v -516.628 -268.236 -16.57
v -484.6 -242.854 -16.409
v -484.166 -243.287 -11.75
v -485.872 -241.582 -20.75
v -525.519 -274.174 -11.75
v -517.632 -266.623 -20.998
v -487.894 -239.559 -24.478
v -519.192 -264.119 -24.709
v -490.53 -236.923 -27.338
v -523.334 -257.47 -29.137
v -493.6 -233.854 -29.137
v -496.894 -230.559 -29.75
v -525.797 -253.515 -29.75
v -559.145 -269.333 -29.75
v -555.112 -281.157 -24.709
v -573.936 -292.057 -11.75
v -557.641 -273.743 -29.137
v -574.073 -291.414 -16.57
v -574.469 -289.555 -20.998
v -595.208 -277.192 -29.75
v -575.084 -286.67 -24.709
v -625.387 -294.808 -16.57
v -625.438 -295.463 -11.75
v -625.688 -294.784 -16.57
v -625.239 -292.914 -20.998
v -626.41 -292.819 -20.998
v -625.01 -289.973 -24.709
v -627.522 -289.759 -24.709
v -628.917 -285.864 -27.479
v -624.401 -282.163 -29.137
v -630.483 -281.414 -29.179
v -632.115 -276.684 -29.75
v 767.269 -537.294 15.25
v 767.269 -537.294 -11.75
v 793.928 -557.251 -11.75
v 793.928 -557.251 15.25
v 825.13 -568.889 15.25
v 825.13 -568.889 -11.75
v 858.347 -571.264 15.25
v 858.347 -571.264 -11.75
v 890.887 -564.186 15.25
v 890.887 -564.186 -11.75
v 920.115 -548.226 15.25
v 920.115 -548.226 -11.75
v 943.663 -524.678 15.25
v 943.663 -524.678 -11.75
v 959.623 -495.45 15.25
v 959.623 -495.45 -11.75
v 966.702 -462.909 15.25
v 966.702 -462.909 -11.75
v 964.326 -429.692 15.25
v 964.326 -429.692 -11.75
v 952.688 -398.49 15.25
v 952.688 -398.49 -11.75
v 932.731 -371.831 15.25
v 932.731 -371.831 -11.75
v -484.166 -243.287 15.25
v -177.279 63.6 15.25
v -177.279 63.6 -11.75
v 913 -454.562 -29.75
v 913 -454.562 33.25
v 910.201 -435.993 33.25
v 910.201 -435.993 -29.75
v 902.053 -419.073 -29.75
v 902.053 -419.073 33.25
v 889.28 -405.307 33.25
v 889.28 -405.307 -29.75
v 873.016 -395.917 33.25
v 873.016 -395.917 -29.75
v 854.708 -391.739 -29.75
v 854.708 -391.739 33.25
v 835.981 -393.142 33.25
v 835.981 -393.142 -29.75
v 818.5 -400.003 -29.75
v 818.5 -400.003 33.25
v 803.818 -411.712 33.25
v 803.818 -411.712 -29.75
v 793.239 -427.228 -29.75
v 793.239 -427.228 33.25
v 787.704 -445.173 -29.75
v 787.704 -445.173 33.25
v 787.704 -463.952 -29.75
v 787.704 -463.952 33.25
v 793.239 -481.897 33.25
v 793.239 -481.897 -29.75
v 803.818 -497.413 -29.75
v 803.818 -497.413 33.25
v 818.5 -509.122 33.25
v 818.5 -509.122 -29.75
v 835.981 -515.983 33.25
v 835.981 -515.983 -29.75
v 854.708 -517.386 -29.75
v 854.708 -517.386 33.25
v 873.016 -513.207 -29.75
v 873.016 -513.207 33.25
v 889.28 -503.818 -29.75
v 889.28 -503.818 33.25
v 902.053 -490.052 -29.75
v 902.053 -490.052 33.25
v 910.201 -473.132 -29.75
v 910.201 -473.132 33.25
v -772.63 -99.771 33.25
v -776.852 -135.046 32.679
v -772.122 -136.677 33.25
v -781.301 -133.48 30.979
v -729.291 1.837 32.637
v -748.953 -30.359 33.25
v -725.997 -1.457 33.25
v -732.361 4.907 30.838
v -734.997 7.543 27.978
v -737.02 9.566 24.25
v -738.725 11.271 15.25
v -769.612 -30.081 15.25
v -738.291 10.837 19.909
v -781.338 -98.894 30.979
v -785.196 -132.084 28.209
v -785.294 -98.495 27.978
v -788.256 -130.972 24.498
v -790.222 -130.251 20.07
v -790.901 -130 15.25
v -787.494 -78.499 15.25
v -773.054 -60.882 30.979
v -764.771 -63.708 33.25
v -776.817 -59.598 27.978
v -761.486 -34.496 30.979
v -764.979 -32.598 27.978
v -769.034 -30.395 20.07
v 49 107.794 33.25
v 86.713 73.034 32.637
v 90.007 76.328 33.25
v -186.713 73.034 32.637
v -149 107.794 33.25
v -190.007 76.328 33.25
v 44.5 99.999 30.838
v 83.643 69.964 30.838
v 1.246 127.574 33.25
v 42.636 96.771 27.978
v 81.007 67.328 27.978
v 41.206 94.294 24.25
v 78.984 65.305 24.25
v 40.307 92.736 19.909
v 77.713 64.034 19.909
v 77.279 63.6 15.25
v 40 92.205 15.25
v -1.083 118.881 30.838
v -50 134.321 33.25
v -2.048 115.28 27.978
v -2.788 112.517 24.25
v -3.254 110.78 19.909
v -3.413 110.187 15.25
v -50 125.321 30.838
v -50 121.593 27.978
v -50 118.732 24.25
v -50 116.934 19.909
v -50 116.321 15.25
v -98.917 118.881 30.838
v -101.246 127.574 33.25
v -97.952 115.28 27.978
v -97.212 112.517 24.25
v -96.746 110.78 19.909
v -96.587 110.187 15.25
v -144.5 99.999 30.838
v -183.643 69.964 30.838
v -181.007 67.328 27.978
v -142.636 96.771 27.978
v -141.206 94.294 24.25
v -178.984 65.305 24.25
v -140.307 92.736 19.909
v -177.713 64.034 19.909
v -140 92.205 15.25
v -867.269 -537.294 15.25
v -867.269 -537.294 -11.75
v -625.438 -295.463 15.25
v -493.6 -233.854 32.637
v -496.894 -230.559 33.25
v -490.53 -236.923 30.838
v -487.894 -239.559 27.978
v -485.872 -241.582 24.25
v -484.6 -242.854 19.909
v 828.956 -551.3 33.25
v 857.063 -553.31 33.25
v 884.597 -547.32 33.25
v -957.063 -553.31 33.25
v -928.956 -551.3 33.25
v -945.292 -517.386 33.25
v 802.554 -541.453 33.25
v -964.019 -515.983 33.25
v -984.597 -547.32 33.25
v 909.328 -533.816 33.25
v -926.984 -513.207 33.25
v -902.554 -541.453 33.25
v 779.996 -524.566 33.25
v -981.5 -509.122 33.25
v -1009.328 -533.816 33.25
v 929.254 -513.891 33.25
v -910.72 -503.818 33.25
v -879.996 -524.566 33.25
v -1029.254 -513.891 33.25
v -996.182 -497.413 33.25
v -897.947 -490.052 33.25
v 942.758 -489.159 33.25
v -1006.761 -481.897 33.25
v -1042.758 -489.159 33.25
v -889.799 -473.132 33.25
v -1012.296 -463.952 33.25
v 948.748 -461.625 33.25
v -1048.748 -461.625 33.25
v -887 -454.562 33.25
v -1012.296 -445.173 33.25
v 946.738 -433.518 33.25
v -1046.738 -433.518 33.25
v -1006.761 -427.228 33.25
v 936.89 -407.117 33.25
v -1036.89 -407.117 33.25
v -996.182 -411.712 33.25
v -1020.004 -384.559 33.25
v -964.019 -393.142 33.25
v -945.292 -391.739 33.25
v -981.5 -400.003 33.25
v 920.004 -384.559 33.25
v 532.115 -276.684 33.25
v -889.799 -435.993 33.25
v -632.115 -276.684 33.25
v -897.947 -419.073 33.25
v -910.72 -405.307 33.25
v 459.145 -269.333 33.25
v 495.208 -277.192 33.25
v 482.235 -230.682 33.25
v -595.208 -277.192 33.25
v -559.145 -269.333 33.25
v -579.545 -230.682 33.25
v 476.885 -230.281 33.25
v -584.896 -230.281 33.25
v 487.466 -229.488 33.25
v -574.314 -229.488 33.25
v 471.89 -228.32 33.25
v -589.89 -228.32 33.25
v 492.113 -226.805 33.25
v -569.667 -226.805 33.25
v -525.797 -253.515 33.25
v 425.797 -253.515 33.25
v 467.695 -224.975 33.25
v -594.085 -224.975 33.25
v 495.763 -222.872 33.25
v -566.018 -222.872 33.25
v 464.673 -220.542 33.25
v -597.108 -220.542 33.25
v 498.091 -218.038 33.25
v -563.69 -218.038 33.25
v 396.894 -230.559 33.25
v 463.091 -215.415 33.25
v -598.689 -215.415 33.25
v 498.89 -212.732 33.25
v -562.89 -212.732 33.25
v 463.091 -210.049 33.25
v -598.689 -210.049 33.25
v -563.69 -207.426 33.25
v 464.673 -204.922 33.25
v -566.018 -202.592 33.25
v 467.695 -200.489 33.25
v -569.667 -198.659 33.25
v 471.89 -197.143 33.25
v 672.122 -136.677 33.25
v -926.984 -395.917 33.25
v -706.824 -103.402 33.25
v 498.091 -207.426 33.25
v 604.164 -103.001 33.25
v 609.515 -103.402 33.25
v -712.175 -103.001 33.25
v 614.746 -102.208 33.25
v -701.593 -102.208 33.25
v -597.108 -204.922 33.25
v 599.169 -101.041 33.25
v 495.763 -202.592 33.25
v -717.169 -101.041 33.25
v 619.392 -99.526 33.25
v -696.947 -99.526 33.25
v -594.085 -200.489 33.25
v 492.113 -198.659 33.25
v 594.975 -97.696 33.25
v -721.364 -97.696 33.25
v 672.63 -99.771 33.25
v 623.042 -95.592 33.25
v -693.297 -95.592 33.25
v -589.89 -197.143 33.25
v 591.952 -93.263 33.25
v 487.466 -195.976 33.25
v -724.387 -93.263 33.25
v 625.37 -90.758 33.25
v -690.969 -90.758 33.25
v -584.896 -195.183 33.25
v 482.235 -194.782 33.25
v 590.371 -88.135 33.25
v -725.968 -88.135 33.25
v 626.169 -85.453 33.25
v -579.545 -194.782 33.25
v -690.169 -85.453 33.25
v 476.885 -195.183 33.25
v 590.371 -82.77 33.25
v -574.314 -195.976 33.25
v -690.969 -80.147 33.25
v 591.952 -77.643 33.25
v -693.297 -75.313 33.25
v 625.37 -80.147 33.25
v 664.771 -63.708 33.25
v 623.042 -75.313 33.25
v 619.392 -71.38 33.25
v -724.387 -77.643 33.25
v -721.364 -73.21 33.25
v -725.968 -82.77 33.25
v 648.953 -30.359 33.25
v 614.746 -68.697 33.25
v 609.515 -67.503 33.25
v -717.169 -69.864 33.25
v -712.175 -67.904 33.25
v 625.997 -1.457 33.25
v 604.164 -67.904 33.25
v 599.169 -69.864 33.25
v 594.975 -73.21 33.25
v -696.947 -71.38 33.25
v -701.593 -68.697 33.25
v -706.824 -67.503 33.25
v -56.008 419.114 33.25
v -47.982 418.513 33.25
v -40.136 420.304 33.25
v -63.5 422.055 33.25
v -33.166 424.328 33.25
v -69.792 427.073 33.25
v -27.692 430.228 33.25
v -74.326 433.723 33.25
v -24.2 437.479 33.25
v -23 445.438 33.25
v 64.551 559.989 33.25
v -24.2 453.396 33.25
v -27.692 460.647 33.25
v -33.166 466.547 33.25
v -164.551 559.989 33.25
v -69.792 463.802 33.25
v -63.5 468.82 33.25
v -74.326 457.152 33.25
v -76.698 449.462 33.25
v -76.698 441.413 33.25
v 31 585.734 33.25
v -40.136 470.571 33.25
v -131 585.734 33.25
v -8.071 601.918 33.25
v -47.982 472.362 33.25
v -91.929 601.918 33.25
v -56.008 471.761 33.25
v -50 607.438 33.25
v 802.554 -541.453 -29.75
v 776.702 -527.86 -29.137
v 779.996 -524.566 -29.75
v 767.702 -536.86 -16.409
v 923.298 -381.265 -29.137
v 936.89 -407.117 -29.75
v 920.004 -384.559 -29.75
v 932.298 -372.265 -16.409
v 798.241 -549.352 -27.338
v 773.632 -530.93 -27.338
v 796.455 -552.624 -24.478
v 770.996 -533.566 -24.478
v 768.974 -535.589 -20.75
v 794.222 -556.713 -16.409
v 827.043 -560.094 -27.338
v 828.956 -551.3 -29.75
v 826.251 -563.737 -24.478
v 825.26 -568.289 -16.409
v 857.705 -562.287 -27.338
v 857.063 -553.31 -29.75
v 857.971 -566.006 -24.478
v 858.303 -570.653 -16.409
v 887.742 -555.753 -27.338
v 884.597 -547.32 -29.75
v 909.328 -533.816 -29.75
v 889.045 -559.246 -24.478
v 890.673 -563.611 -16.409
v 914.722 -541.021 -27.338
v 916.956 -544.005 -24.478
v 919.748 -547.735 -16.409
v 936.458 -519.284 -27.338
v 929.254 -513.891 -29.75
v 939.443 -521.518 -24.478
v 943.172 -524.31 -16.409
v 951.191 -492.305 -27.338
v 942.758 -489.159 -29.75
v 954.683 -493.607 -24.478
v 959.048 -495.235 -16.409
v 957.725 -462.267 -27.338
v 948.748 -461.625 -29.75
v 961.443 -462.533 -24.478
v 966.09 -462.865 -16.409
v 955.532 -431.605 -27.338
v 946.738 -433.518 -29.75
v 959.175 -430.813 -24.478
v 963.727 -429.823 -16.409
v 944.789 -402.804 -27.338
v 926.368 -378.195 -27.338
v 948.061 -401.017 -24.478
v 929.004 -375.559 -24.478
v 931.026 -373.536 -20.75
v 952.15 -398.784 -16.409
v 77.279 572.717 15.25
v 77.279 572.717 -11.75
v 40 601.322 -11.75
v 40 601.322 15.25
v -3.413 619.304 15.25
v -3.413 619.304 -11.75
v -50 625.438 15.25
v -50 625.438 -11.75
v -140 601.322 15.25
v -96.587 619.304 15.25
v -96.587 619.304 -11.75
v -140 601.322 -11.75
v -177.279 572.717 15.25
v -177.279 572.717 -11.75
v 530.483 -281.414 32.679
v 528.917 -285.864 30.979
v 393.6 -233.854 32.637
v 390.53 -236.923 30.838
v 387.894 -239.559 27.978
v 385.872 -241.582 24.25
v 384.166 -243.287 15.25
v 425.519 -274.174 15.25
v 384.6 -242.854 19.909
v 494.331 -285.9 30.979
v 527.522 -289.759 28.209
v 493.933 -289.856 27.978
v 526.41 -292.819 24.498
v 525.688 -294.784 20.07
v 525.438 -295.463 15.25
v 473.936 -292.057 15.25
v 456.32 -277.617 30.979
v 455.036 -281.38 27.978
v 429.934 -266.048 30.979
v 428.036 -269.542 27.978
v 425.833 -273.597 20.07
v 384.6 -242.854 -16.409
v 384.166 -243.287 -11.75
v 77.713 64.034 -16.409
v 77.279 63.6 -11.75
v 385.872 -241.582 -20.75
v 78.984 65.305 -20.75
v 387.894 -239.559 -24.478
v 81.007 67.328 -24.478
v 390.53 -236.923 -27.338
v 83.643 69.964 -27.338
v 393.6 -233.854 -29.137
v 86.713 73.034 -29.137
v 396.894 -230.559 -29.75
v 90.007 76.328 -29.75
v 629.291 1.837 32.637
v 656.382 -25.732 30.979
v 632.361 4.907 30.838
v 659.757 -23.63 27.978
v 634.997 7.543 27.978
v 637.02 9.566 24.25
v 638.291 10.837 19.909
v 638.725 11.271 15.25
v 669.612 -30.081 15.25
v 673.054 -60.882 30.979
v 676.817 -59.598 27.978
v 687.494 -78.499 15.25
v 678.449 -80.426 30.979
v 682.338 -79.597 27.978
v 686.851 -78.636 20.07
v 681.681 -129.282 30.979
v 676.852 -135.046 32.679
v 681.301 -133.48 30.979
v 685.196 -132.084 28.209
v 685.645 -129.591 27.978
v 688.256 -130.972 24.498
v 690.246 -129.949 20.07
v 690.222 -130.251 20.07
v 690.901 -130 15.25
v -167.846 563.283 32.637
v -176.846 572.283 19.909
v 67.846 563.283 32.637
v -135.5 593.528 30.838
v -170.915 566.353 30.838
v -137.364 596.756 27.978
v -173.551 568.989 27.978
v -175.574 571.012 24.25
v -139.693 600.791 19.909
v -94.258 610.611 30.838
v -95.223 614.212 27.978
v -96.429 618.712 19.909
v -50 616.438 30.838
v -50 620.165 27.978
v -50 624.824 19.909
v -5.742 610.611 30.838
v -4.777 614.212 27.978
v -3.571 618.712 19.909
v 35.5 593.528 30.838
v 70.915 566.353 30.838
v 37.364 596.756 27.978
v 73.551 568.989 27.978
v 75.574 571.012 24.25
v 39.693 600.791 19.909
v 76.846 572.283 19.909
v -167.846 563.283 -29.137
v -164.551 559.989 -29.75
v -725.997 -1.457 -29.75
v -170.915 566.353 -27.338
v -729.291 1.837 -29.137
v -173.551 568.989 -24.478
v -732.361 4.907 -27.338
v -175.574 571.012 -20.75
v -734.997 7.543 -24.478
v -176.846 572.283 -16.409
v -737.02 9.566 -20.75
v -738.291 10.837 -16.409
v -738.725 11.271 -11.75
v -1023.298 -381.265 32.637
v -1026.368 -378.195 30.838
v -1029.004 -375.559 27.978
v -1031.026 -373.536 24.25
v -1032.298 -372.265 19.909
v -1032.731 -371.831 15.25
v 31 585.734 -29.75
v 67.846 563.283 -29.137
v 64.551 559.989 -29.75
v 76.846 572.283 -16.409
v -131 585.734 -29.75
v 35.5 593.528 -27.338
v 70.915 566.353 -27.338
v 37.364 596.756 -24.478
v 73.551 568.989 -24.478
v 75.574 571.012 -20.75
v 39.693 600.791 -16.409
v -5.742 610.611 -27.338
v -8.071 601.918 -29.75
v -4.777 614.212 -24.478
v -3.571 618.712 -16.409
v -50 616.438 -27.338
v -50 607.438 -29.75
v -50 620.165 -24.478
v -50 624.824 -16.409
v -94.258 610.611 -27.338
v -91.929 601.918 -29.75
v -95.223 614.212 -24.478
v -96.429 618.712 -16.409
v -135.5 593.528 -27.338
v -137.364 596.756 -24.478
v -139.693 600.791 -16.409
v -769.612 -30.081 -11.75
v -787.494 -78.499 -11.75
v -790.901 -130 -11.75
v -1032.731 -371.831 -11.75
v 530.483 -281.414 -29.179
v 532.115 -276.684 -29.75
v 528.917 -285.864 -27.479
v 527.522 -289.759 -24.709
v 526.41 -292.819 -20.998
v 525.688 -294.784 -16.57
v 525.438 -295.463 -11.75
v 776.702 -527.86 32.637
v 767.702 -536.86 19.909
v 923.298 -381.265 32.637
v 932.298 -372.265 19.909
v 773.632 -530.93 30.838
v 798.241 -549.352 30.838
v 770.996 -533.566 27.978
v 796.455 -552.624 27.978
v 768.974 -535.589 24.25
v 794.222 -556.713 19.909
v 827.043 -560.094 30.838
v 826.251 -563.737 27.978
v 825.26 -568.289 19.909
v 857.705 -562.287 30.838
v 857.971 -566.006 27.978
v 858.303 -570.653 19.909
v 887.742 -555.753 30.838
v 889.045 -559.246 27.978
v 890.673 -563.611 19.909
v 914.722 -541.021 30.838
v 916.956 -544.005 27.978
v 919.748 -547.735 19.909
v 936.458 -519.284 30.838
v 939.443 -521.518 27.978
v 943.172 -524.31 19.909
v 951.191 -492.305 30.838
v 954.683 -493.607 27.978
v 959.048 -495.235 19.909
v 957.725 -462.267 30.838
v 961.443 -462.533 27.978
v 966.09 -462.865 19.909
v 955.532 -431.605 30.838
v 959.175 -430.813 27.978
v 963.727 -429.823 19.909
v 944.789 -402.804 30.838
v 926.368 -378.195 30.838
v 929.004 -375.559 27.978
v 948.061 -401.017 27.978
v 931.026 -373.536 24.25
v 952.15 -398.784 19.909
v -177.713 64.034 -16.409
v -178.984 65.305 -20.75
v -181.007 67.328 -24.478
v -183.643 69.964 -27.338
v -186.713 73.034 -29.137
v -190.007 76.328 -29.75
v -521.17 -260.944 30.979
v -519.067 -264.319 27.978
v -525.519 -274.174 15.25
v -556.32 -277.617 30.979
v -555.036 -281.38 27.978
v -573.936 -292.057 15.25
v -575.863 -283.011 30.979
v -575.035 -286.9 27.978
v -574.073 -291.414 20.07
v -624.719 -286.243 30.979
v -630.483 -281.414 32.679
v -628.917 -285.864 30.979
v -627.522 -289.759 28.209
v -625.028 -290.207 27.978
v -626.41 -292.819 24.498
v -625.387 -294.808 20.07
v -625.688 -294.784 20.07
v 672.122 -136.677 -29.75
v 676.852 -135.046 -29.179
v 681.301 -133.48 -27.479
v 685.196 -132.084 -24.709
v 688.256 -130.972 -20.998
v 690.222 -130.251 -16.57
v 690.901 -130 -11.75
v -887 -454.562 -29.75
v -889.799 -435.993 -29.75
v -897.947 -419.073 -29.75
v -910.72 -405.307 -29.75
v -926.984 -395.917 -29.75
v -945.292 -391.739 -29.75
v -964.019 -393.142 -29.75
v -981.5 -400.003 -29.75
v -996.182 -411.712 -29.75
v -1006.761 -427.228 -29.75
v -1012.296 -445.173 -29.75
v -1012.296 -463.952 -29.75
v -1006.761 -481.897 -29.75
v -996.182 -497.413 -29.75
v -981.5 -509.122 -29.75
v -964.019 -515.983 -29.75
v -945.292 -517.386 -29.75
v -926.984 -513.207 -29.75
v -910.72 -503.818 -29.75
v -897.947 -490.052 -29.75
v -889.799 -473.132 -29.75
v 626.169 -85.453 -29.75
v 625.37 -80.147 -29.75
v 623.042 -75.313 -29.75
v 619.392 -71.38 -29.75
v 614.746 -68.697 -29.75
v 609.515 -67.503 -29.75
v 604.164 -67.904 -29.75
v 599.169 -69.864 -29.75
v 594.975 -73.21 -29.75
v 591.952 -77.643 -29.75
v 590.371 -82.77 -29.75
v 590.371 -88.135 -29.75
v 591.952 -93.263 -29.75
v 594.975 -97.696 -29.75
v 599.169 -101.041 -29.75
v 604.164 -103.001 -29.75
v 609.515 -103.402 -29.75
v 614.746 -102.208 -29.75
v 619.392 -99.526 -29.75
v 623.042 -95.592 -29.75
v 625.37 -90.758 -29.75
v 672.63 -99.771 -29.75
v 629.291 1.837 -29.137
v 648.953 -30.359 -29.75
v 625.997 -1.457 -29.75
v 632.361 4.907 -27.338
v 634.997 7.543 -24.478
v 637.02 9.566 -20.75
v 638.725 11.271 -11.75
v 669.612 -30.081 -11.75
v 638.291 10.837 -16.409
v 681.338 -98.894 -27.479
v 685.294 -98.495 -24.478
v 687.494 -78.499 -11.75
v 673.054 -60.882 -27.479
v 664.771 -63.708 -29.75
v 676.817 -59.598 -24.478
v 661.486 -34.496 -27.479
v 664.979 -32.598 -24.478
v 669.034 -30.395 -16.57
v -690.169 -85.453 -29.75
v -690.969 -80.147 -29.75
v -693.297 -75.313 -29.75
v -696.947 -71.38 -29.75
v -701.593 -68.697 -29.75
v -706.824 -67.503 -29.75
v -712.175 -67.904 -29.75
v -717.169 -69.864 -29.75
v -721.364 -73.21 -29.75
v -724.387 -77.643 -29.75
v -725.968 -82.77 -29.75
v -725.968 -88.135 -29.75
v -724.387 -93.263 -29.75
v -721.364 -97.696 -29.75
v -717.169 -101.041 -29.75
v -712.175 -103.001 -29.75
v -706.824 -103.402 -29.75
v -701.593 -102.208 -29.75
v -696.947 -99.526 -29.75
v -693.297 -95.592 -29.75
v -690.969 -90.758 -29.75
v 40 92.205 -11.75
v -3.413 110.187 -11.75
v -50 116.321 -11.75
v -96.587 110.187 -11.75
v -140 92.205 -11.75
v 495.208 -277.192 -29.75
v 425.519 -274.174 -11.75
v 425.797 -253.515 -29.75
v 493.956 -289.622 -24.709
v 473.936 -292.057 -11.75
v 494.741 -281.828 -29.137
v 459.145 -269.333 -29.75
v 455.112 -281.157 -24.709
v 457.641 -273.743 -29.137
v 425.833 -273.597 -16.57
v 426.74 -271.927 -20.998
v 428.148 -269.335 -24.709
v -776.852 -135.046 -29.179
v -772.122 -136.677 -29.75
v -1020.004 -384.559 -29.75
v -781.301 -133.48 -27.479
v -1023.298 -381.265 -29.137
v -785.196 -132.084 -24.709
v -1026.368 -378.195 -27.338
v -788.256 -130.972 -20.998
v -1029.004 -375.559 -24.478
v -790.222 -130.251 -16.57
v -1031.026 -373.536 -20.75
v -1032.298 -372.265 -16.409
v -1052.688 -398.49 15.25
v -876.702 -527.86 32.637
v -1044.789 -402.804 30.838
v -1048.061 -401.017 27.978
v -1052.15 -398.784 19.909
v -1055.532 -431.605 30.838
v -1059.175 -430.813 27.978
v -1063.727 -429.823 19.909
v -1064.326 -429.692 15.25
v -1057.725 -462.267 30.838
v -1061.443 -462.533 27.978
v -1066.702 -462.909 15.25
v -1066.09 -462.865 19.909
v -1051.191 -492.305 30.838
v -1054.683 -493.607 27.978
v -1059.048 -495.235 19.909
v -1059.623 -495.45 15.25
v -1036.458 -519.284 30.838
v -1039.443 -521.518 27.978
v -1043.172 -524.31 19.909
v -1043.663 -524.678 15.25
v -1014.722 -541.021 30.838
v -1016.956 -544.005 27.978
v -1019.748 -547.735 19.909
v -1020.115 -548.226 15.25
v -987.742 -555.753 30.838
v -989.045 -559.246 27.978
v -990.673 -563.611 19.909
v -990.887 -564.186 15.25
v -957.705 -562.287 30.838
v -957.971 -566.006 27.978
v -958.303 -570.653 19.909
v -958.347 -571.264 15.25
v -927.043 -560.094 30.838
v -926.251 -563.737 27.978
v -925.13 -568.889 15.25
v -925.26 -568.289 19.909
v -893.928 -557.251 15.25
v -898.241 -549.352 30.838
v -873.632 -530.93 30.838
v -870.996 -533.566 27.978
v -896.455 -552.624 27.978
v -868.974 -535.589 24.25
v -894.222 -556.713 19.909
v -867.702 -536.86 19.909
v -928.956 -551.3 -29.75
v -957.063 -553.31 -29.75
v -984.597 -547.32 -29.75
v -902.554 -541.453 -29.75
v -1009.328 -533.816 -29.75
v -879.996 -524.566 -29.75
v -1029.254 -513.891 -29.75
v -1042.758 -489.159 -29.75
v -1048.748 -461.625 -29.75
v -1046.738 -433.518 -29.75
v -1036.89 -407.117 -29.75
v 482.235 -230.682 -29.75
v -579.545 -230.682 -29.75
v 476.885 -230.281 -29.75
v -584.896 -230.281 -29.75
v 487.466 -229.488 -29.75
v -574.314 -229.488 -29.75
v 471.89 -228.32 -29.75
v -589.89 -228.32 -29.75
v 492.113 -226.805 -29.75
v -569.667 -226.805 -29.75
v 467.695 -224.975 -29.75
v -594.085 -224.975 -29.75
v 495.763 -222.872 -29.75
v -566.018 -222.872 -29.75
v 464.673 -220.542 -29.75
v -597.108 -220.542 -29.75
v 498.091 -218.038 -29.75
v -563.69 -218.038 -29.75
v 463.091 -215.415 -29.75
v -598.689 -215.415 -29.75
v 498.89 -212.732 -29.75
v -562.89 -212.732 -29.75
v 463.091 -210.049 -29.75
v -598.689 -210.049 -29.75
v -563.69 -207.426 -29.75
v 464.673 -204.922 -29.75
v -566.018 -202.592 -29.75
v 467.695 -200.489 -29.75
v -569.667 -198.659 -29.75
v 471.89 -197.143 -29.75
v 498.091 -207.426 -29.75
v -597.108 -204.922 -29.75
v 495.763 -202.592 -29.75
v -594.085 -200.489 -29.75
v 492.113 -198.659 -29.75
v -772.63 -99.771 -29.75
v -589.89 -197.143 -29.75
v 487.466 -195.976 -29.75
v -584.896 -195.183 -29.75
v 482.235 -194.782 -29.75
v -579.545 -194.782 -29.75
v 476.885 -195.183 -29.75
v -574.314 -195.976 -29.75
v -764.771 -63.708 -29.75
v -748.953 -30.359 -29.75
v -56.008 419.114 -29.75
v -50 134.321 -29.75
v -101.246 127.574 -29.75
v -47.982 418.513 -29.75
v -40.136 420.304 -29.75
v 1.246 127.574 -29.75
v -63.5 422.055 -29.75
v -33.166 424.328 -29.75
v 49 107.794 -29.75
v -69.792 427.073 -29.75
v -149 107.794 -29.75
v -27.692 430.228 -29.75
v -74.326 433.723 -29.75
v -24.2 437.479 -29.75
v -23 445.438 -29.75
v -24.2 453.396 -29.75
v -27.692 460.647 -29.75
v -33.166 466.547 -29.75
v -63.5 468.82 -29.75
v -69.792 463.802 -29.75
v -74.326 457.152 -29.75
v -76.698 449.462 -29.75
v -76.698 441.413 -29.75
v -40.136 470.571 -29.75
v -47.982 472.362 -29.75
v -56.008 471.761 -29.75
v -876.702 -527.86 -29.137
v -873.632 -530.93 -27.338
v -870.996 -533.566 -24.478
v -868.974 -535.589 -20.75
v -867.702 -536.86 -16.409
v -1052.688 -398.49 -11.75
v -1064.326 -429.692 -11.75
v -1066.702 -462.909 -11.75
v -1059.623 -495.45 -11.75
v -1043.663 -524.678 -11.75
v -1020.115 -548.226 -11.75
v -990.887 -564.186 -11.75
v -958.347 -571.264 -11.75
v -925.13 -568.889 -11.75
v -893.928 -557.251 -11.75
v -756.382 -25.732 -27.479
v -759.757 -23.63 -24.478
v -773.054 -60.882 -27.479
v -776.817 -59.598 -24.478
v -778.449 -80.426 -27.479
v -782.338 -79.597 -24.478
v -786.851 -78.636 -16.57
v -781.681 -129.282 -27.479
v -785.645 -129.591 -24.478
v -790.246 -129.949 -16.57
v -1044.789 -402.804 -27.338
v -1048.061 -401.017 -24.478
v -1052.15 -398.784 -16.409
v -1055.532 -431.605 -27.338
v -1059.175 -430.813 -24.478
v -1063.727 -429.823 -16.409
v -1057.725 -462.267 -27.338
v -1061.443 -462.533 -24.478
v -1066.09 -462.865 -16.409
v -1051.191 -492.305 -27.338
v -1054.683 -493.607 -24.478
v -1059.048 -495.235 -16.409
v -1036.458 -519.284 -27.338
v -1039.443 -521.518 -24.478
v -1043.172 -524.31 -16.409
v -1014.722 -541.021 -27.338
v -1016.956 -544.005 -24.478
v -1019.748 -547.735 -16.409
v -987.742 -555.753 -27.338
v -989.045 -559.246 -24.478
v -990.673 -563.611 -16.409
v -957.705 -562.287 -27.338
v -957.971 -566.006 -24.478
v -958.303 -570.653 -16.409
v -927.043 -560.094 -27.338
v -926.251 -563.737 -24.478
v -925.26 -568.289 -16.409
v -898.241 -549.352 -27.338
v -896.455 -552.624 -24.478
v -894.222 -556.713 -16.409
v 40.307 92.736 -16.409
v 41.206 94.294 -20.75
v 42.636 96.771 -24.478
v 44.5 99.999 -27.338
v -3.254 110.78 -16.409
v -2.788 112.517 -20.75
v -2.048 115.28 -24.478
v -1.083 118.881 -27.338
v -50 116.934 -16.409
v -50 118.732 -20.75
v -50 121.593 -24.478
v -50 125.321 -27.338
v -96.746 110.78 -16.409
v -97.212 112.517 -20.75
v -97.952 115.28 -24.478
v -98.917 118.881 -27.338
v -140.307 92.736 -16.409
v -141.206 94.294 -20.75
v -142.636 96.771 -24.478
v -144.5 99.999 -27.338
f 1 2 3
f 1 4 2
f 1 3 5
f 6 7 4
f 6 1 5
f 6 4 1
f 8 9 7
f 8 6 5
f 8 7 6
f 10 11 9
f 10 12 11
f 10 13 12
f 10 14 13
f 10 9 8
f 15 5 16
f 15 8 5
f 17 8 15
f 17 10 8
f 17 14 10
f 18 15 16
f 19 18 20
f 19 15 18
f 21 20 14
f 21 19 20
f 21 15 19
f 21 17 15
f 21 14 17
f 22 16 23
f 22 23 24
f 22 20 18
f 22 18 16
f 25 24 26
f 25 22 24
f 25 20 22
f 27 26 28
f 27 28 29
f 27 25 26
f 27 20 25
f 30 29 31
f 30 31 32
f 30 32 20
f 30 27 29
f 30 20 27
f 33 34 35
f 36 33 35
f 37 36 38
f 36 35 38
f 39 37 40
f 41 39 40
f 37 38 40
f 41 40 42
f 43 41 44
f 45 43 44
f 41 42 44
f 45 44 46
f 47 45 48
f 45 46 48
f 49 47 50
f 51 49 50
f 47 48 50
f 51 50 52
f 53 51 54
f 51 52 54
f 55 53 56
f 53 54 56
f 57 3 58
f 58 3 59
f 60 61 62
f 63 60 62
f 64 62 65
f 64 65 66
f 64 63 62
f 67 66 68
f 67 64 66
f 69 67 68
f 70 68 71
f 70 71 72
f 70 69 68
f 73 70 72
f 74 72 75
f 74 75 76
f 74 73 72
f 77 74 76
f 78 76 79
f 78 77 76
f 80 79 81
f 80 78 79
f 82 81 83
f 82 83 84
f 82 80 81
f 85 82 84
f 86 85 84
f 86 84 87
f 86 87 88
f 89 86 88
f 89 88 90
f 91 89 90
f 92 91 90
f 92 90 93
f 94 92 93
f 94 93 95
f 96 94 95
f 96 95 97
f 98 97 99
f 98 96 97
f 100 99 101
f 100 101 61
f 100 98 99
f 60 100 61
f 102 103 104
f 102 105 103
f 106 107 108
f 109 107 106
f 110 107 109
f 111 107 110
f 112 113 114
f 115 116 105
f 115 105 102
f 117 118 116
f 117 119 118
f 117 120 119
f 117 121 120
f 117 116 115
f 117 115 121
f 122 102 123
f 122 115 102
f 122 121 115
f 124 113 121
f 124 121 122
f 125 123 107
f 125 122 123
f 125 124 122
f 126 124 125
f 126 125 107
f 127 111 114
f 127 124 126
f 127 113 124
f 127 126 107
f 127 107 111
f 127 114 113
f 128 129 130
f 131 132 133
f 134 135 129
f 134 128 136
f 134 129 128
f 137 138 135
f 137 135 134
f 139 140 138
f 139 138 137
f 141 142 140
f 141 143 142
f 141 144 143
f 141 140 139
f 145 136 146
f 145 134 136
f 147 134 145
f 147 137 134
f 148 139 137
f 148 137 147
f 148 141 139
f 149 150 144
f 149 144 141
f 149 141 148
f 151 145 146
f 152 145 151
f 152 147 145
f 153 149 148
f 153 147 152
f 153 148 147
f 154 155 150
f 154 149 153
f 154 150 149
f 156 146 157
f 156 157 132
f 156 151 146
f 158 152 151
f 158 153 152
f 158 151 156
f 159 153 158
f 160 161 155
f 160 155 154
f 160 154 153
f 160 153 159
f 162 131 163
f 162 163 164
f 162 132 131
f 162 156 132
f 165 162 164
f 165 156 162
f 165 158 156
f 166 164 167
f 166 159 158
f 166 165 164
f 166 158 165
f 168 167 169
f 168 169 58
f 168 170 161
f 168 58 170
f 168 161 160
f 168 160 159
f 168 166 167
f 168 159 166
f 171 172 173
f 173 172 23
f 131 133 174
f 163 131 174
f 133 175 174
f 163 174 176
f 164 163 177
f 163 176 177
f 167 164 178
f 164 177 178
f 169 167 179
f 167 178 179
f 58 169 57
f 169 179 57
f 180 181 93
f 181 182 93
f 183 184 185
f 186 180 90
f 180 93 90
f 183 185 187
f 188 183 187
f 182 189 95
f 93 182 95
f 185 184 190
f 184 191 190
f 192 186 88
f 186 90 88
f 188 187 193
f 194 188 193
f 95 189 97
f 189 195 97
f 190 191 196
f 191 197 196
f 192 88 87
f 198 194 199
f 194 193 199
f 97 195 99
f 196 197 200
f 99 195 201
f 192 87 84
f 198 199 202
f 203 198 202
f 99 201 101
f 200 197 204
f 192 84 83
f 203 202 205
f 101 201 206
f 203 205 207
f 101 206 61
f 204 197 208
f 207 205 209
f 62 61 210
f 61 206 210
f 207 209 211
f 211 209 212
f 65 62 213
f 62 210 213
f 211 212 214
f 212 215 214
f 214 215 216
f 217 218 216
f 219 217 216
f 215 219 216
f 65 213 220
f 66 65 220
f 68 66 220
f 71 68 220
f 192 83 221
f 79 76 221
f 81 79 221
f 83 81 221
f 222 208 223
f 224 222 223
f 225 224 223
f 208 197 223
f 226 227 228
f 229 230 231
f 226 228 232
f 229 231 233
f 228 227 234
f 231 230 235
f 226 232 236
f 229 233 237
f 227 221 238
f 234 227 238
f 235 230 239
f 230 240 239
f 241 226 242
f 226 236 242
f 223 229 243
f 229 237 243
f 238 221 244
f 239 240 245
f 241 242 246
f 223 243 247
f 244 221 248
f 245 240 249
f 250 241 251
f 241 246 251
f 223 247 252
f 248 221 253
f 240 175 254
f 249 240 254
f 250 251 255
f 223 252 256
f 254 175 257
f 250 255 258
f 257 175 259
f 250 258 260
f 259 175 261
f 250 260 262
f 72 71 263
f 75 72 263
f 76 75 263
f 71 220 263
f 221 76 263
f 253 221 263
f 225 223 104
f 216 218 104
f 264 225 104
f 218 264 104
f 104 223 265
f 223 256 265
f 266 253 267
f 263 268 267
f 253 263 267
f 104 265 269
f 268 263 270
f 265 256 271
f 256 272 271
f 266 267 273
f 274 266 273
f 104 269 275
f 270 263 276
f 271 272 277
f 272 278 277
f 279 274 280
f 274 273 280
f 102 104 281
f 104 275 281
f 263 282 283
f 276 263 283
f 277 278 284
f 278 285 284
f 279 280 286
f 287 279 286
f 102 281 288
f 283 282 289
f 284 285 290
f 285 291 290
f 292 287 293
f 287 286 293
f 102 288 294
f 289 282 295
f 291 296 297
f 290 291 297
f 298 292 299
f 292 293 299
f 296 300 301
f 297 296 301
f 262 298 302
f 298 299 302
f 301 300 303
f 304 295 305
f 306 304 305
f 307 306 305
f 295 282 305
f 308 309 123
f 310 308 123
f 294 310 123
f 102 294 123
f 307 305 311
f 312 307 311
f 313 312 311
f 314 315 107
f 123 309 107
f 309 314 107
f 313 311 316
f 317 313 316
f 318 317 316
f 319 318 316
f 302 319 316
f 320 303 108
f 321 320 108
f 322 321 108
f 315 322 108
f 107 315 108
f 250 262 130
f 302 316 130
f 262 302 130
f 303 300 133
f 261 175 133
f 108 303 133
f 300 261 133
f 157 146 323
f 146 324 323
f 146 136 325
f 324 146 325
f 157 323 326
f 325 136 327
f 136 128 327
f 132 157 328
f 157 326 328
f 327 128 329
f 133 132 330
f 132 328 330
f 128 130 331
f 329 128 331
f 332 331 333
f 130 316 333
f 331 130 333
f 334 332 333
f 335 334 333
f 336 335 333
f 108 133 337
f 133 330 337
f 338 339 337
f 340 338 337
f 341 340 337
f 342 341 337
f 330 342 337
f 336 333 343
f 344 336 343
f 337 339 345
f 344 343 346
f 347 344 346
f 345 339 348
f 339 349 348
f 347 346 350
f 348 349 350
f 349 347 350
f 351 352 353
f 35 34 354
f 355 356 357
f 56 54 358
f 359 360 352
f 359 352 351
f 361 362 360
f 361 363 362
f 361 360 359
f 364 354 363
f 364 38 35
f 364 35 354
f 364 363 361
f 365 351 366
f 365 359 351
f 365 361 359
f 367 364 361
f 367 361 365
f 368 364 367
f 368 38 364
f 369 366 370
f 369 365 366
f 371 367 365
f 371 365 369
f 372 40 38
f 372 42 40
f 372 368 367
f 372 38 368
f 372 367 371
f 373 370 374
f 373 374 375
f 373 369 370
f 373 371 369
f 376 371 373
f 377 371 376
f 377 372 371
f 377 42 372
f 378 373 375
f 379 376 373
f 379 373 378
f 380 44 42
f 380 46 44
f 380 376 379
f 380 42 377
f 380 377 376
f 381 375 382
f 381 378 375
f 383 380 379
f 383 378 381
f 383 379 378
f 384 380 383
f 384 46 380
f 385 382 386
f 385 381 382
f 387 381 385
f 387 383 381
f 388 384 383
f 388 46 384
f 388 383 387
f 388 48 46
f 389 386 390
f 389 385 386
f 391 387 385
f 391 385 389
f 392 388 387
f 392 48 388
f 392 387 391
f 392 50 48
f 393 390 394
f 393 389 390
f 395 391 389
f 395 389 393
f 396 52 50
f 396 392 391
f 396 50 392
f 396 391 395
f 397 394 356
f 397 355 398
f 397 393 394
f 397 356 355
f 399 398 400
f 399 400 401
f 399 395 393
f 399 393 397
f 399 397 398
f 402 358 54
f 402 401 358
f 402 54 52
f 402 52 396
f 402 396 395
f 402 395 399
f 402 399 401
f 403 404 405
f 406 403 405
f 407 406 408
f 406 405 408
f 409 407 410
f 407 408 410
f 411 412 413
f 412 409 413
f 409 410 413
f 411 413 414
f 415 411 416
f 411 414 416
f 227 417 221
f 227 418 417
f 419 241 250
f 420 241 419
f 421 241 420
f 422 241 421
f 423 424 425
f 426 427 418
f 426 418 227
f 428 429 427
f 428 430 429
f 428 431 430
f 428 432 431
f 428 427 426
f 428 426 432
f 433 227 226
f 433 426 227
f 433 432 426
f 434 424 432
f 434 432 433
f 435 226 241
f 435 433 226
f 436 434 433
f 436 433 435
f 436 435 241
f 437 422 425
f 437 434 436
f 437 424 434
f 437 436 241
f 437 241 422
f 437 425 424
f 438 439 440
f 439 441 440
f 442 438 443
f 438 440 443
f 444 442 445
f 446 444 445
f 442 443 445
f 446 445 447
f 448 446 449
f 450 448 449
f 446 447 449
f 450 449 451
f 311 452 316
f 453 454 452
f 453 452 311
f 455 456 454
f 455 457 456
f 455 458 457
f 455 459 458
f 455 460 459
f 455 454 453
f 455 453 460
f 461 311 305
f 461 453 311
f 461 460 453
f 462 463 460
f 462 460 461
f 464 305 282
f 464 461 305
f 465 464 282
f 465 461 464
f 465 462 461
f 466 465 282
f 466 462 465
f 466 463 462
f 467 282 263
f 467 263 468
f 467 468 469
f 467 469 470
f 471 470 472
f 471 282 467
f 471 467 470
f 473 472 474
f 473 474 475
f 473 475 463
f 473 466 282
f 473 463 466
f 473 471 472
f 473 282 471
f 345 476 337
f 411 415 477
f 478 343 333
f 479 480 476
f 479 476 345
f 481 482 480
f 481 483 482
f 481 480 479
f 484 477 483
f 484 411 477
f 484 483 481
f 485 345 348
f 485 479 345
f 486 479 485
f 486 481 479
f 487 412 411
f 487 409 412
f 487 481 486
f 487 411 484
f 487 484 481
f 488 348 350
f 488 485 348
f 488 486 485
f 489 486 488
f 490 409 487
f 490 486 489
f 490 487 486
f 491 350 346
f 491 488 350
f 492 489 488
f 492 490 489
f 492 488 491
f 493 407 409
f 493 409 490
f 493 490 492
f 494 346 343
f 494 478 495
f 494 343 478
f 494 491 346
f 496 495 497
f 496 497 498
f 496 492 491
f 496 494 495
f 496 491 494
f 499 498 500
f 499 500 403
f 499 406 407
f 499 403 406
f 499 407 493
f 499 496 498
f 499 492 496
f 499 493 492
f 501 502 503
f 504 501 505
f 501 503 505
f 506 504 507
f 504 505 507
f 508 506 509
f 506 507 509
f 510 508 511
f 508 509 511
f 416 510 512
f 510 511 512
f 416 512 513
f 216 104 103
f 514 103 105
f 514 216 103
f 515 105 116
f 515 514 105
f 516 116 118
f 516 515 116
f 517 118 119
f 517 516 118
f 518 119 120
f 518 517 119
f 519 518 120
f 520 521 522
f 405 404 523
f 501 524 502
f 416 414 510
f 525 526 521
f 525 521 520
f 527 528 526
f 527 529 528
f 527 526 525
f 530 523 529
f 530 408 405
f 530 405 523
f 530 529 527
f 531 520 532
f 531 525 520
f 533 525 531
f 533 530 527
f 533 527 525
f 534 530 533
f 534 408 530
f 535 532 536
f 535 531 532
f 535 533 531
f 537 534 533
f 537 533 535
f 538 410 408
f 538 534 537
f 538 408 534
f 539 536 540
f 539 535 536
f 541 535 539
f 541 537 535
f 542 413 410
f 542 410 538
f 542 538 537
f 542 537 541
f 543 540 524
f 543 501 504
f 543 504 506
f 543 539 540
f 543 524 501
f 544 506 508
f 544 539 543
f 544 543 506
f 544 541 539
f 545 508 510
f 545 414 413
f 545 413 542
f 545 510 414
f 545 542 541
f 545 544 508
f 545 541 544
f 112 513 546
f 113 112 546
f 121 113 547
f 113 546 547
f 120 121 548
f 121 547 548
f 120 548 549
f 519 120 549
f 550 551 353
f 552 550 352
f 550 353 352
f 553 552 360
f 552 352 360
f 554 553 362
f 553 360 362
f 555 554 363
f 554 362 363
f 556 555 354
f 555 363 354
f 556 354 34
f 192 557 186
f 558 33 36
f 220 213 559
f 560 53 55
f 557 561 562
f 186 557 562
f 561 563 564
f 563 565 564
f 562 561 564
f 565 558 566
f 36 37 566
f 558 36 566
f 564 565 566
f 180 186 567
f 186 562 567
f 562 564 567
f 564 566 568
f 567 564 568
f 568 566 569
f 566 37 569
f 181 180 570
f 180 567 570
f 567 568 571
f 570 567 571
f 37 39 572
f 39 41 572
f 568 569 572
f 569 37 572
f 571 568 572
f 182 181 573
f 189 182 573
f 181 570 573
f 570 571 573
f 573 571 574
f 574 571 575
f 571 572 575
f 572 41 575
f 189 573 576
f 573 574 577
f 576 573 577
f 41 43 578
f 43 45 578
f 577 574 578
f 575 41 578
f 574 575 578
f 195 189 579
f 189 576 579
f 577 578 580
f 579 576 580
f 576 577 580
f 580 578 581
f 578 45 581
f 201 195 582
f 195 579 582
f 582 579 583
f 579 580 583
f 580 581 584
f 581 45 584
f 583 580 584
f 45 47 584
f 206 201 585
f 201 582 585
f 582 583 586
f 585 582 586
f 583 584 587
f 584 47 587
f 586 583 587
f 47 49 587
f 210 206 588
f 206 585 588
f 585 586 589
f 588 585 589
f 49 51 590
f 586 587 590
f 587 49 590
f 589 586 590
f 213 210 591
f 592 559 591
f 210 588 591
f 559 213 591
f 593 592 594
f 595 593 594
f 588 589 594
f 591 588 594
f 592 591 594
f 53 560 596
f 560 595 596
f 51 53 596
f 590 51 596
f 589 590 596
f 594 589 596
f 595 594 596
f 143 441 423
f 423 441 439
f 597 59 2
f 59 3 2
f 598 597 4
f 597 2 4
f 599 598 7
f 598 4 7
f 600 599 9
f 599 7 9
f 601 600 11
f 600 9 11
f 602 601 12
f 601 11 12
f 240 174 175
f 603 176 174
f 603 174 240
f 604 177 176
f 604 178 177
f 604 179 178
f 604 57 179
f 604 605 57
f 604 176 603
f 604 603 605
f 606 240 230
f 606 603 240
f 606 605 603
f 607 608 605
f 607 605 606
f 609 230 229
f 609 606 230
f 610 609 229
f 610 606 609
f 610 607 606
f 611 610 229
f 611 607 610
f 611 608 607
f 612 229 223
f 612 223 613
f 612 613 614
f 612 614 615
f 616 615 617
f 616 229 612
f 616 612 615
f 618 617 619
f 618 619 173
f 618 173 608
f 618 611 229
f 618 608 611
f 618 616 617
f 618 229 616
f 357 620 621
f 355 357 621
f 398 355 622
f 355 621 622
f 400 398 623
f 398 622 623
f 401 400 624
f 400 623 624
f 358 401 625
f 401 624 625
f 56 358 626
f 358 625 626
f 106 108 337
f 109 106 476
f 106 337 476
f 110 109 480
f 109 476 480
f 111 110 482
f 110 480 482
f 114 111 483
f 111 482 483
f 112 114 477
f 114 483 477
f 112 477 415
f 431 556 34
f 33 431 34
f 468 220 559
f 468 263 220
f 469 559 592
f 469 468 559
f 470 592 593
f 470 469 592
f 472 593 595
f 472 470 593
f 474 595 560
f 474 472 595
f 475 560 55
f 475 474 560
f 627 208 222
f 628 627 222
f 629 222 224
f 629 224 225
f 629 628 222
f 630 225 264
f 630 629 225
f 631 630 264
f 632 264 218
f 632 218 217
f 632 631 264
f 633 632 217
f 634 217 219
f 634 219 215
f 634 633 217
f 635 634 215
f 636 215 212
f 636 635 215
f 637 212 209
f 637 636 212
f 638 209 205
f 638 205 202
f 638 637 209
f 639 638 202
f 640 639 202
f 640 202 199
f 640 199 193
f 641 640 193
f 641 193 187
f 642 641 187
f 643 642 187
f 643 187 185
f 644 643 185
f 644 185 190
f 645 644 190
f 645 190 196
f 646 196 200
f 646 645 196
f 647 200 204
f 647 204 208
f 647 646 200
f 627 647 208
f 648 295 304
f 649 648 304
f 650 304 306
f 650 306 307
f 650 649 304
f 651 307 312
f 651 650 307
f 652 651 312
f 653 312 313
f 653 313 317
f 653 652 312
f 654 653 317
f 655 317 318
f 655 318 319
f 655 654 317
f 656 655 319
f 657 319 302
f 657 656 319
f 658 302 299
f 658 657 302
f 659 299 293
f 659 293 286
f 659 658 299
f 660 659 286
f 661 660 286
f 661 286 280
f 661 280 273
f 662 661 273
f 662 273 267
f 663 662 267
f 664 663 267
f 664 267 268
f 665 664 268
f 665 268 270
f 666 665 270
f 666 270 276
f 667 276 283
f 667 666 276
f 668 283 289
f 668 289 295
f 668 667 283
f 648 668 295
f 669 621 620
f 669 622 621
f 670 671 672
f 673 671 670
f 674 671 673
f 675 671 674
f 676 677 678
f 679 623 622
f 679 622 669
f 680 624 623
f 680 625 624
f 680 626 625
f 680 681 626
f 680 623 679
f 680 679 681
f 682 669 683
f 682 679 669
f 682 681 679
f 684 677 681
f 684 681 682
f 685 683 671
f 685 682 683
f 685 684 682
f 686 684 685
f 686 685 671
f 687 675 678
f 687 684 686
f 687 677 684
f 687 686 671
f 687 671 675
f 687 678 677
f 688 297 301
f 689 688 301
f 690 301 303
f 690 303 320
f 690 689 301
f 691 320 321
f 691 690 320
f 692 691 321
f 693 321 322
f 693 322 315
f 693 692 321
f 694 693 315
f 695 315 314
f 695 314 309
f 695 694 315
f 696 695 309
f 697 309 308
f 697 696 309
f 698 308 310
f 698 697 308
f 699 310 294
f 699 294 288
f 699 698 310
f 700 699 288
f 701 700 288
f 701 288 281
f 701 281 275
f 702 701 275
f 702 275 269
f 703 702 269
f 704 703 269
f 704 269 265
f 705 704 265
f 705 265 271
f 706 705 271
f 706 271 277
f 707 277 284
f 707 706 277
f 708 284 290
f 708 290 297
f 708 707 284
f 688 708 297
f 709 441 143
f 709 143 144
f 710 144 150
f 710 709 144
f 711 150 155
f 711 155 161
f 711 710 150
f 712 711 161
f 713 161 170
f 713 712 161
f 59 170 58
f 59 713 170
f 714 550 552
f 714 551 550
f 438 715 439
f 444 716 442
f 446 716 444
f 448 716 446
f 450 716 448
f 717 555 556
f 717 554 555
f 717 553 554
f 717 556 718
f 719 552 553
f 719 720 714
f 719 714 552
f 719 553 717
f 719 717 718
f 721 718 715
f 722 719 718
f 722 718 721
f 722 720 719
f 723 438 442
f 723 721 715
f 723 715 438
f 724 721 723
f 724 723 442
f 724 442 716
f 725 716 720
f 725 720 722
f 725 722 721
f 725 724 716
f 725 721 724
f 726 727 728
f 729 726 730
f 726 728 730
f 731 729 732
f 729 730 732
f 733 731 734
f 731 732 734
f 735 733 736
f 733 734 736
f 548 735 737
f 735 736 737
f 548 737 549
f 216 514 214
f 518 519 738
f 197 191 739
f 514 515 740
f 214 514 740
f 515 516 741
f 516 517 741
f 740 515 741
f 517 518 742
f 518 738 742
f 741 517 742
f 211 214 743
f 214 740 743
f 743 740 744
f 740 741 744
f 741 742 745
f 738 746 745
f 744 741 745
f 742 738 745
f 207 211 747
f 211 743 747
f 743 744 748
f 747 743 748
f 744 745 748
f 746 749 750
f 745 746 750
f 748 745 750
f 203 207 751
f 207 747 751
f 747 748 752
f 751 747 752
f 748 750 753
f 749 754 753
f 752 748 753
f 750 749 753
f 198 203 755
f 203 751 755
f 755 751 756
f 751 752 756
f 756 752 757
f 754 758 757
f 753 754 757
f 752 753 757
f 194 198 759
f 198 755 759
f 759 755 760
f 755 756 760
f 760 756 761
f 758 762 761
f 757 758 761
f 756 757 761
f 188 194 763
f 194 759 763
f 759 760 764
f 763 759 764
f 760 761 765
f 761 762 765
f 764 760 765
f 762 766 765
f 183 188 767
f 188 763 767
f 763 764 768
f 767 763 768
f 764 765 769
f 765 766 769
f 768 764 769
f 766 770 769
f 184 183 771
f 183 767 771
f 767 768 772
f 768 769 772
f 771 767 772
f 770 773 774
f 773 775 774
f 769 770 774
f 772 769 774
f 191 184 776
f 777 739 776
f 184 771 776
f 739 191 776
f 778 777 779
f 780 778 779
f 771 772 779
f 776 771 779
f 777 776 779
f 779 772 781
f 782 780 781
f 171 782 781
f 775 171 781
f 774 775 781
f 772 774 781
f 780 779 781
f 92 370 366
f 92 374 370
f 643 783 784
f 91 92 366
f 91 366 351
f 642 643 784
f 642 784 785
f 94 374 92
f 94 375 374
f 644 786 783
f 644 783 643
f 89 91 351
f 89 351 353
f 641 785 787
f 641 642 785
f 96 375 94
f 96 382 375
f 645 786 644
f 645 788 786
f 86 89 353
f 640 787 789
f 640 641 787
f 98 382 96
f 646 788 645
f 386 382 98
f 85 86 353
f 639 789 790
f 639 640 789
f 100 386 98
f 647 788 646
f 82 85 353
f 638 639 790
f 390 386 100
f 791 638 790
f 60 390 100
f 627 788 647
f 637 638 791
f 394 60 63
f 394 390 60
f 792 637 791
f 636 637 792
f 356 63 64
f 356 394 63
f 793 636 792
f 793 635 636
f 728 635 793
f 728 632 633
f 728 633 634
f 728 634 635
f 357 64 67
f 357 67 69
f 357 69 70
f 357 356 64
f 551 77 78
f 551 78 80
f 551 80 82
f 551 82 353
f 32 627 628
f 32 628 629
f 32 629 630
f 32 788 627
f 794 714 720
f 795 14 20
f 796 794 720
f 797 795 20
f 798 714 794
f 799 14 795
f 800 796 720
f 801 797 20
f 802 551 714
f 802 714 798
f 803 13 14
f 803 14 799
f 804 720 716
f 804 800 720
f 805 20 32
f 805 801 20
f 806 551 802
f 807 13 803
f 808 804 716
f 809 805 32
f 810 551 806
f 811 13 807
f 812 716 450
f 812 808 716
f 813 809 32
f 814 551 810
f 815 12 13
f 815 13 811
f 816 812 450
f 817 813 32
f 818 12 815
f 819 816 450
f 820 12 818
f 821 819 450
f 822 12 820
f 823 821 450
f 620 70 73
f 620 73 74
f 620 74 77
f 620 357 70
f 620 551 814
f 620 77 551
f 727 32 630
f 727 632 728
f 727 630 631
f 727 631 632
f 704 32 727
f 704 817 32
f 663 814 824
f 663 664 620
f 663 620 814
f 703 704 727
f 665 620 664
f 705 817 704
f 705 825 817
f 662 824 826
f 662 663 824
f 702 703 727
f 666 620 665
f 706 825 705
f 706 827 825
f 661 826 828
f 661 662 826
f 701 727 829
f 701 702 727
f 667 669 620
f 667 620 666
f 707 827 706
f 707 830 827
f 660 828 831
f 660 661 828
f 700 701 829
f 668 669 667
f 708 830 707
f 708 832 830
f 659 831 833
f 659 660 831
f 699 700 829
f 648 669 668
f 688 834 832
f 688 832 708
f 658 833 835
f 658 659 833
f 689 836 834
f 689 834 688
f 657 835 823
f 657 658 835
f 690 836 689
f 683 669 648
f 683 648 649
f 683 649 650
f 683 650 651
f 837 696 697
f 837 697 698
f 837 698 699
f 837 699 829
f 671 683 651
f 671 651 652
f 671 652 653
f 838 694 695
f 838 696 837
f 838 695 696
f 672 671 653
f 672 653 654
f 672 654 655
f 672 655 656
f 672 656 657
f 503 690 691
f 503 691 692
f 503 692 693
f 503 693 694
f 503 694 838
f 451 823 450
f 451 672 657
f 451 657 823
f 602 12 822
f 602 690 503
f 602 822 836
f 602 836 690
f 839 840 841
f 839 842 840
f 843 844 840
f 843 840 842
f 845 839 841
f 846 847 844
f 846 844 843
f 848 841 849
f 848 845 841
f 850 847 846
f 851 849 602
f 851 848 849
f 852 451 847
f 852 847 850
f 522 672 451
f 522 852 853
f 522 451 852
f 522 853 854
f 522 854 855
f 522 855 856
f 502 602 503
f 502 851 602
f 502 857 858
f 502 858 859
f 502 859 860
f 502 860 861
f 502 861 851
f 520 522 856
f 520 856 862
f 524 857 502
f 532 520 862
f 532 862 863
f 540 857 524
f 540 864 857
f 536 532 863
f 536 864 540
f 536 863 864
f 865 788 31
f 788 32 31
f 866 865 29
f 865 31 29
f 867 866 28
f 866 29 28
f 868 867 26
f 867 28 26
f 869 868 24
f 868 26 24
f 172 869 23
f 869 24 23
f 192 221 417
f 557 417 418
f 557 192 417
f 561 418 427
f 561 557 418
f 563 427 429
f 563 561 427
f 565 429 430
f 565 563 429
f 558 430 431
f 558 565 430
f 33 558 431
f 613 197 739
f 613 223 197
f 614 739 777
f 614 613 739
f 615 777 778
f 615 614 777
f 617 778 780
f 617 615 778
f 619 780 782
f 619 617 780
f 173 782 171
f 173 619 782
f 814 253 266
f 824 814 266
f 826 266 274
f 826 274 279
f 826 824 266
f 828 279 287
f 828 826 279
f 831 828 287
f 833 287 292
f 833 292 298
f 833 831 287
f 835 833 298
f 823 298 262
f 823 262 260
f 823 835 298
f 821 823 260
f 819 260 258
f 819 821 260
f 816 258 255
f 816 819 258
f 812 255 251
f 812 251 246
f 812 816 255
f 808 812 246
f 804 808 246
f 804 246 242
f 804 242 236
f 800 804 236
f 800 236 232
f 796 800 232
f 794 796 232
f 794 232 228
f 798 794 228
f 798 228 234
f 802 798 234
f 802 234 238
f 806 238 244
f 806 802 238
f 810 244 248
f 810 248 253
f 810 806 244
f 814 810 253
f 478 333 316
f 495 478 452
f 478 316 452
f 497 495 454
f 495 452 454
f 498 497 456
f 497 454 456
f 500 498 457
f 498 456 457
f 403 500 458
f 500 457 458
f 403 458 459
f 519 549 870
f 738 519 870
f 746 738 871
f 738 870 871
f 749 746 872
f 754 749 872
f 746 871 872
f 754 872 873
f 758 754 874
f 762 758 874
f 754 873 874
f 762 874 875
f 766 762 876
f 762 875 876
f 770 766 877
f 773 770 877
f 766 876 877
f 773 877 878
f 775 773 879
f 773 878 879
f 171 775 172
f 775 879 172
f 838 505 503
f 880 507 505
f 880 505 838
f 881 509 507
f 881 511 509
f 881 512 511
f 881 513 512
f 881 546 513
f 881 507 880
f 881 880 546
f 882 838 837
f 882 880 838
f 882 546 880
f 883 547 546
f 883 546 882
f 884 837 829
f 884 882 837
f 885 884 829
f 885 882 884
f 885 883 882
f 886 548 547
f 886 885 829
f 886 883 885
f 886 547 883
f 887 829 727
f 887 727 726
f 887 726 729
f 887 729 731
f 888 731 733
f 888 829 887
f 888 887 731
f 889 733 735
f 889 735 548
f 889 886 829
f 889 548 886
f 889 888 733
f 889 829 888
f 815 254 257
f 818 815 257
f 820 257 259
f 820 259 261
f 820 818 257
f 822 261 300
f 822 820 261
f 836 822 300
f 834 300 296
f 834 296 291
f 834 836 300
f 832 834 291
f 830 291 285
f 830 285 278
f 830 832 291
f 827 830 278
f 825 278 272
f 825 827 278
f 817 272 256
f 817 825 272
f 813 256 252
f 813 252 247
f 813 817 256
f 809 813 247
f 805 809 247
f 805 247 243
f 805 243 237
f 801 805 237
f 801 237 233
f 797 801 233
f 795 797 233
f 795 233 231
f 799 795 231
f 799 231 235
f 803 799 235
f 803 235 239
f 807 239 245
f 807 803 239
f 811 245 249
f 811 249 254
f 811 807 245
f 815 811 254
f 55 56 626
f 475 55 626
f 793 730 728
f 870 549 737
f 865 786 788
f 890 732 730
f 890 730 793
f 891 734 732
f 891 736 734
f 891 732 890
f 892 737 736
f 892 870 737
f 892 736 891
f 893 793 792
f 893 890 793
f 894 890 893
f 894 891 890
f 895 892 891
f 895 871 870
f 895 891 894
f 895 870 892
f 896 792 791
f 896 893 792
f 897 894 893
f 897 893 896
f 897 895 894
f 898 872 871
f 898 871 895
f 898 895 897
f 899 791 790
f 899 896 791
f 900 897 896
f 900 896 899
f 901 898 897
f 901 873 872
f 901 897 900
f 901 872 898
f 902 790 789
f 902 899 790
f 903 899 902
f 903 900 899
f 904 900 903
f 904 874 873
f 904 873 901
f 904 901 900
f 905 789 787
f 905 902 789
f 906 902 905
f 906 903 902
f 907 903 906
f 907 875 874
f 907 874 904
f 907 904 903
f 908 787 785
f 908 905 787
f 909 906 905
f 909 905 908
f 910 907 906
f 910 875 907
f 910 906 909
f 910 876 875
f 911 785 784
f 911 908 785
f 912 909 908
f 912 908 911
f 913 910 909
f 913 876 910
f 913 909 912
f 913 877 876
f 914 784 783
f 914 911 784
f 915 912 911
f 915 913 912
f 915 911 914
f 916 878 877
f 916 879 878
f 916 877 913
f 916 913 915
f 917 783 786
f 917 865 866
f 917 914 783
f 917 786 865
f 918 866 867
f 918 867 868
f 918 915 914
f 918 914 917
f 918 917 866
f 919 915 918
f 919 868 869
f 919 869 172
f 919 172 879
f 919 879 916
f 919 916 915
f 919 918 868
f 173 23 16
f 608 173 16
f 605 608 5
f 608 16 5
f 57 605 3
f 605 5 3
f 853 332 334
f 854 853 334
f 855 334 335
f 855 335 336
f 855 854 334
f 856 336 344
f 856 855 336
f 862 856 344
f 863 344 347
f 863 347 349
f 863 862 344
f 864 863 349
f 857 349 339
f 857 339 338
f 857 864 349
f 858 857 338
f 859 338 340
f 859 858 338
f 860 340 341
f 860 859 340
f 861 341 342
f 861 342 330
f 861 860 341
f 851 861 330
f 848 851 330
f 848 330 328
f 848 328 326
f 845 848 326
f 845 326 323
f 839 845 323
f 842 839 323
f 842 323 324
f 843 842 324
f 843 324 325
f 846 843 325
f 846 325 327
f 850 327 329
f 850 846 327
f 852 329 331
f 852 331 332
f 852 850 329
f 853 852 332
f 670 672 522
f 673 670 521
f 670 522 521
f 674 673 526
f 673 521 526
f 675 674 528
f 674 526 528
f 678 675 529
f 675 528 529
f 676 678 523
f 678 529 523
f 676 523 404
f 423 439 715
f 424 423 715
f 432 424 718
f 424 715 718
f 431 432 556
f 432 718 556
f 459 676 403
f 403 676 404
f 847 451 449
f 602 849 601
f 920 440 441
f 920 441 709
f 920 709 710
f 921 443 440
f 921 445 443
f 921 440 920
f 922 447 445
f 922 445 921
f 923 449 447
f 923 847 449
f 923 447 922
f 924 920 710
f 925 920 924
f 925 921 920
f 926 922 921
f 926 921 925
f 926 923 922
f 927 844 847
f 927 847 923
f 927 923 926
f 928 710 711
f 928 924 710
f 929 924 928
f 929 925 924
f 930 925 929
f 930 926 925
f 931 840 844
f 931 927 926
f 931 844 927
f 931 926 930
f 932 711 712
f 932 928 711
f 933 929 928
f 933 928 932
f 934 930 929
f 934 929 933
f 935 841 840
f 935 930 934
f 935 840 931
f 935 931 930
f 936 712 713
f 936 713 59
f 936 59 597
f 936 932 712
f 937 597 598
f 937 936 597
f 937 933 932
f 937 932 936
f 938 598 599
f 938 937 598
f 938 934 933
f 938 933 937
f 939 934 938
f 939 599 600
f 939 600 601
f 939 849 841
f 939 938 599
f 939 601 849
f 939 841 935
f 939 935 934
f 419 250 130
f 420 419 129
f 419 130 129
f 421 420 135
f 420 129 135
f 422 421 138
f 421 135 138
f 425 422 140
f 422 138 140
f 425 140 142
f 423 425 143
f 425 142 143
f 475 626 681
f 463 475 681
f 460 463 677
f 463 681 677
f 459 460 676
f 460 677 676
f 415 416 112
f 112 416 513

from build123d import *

# Parameters (mm, degrees)
SKETCH5_R           = 3.5
SKETCH5_R_2         = 1.5
SKETCH5_R_3         = 1
BOSS_EXTRUDE1_DEPTH = 3.5
FILLET1_R           = 10
FILLET2_R           = 1
SCALE1_SCALE        = 18


with BuildPart() as part:
    # Sketch5 → Boss-Extrude1 (new body)
    with BuildSketch(Plane.XY):
        with BuildLine():
            Line((-18.03122292, 8.838834765), (-4.596194078, -4.596194078))
            ThreePointArc((-4.596194078, -4.596194078), (4.596194078, -4.596194078), (4.596194078, 4.596194078))
            Line((4.596194078, 4.596194078), (-8.838834765, 18.03122292))
            Line((-8.838834765, 18.03122292), (-6.363961031, 20.506096654))
            Line((-6.363961031, 20.506096654), (-50, 64.142135624))
            Line((-50, 64.142135624), (-93.636038969, 20.506096654))
            Line((-93.636038969, 20.506096654), (-91.161165235, 18.03122292))
            Line((-91.161165235, 18.03122292), (-104.596194078, 4.596194078))
            ThreePointArc((-104.596194078, 4.596194078), (-104.596194078, -4.596194078), (-95.403805922, -4.596194078))
            Line((-95.403805922, -4.596194078), (-81.96877708, 8.838834765))
            Line((-81.96877708, 8.838834765), (-79.493903346, 6.363961031))
            Line((-79.493903346, 6.363961031), (-50, 35.857864376))
            Line((-50, 35.857864376), (-20.506096654, 6.363961031))
            Line((-20.506096654, 6.363961031), (-18.03122292, 8.838834765))
        make_face()
        Circle(SKETCH5_R, mode=Mode.SUBTRACT)
        with Locations((-100, 0)):
            Circle(SKETCH5_R, mode=Mode.SUBTRACT)
        with Locations((-50, 50)):
            Circle(SKETCH5_R_2, mode=Mode.SUBTRACT)
        with Locations((-13.435028843, 20.506096654)):
            Circle(SKETCH5_R_3, mode=Mode.SUBTRACT)
        with Locations((-20.506096654, 13.435028843)):
            Circle(SKETCH5_R_3, mode=Mode.SUBTRACT)
        with Locations((-79.493903346, 13.435028843)):
            Circle(SKETCH5_R_3, mode=Mode.SUBTRACT)
        with Locations((-86.564971157, 20.506096654)):
            Circle(SKETCH5_R_3, mode=Mode.SUBTRACT)
    extrude(amount=BOSS_EXTRUDE1_DEPTH)

    # Fillet1
    # the kernel refuses this fillet: 10 mm, written as the material it adds along each edge
    with BuildSketch(Plane(origin=(-50, 35.857864376, 0), x_dir=(0.7071067811865507, -0.7071067811865444, 0), z_dir=(0, 0, 1))) as fillet1_piece_1:
        with BuildLine():
            CenterArc((FILLET1_R, -FILLET1_R), FILLET1_R, 90, 90)
            Line((0, -FILLET1_R), (0, 0))
            Line((0, 0), (FILLET1_R, 0))
        make_face()
    extrude(amount=3.5)
    # the kernel refuses this fillet: 10 mm, written as the material it takes off along each edge
    with BuildSketch(Plane(origin=(-93.636038969, 20.506096654, -18.998355192), x_dir=(0.7071067811865474, 0.7071067811865478, 0), z_dir=(0, 0, 1)), Plane(origin=(-20.506096654, 6.363961031, -18.998355192), x_dir=(-0.7071067811865507, 0.7071067811865445, 0), z_dir=(0, 0, 1))) as fillet1_2_piece_1:
        with BuildLine():
            CenterArc((7.599342077, -10), FILLET1_R, 90, 49.458398126)
            Line((0, -3.5), (0, 0))
            Line((0, 0), (7.599342077, 0))
        make_face()
    extrude(amount=41.496710384, mode=Mode.SUBTRACT)
    with BuildSketch(Plane(origin=(-79.493903346, 6.363961031, -18.998355192), x_dir=(-0.707106781186547, 0.707106781186548, 0), z_dir=(0, 0, 1)), Plane(origin=(-6.363961031, 20.506096654, -18.998355192), x_dir=(-0.7071067811865441, -0.707106781186551, 0), z_dir=(0, 0, 1))) as fillet1_2_piece_2:
        with BuildLine():
            CenterArc((10, -7.599342077), FILLET1_R, 130.541601874, 49.458398126)
            Line((0, -7.599342077), (0, 0))
            Line((0, 0), (3.5, 0))
        make_face()
    extrude(amount=41.496710384, mode=Mode.SUBTRACT)
    with BuildSketch(Plane(origin=(-50, 64.142135624, -25), x_dir=(0.7071067811865497, -0.7071067811865454, 0), z_dir=(0, 0, 1))) as fillet1_2_piece_3:
        with BuildLine():
            CenterArc((FILLET1_R, -FILLET1_R), FILLET1_R, 90, 90)
            Line((0, -FILLET1_R), (0, 0))
            Line((0, 0), (FILLET1_R, 0))
        make_face()
    extrude(amount=53.5, mode=Mode.SUBTRACT)

    # Fillet2
    fillet2_edges = [part.edges().sort_by_distance(p)[0] for p in [
        (-9.427918977, 22.273151555, 3.5),
        (-77.726848445, 9.427918977, 3.5),
        (-90.572081023, 22.273151555, 3.5),
        (-50, 31.715728753, 0),
        (-50, 31.715728753, 3.5),
        (-88.686291501, 2.121320344, 0),
        (-104.596194078, -4.596194078, 0),
        (-97.878679656, 11.313708499, 0),
        (-2.121320344, 11.313708499, 0),
        (4.596194078, -4.596194078, 0),
        (-11.313708499, 2.121320344, 0),
        (-11.313708499, 2.121320344, 3.5),
        (4.596194078, -4.596194078, 3.5),
        (-2.121320344, 11.313708499, 3.5),
        (-97.878679656, 11.313708499, 3.5),
        (-104.596194078, -4.596194078, 3.5),
        (-88.686291501, 2.121320344, 3.5),
        (-72.666780233, 41.475355391, 0),
        (-27.333219767, 41.475355391, 0),
        (-34.404287579, 20.262151955, 0),
        (-65.595712421, 20.262151955, 0),
        (-50, 60, 0),
        (-22.273151555, 9.427918977, 0),
        (-9.427918977, 22.273151555, 0),
        (-77.726848445, 9.427918977, 0),
        (-90.572081023, 22.273151555, 0),
        (-72.666780233, 41.475355391, 3.5),
        (-65.595712421, 20.262151955, 3.5),
        (-34.404287579, 20.262151955, 3.5),
        (-27.333219767, 41.475355391, 3.5),
        (-50, 60, 3.5),
        (-22.273151555, 9.427918977, 3.5),
    ]]
    fillet(fillet2_edges, radius=FILLET2_R)


with BuildPart() as part_1:
    # Scale1: scaled about (-50.000000001, 26.738967737, 1.75)
    add(part.part.scale(SCALE1_SCALE).moved(Location((850.000000017, -454.562451529, -29.75))))


solid = part_1.part
